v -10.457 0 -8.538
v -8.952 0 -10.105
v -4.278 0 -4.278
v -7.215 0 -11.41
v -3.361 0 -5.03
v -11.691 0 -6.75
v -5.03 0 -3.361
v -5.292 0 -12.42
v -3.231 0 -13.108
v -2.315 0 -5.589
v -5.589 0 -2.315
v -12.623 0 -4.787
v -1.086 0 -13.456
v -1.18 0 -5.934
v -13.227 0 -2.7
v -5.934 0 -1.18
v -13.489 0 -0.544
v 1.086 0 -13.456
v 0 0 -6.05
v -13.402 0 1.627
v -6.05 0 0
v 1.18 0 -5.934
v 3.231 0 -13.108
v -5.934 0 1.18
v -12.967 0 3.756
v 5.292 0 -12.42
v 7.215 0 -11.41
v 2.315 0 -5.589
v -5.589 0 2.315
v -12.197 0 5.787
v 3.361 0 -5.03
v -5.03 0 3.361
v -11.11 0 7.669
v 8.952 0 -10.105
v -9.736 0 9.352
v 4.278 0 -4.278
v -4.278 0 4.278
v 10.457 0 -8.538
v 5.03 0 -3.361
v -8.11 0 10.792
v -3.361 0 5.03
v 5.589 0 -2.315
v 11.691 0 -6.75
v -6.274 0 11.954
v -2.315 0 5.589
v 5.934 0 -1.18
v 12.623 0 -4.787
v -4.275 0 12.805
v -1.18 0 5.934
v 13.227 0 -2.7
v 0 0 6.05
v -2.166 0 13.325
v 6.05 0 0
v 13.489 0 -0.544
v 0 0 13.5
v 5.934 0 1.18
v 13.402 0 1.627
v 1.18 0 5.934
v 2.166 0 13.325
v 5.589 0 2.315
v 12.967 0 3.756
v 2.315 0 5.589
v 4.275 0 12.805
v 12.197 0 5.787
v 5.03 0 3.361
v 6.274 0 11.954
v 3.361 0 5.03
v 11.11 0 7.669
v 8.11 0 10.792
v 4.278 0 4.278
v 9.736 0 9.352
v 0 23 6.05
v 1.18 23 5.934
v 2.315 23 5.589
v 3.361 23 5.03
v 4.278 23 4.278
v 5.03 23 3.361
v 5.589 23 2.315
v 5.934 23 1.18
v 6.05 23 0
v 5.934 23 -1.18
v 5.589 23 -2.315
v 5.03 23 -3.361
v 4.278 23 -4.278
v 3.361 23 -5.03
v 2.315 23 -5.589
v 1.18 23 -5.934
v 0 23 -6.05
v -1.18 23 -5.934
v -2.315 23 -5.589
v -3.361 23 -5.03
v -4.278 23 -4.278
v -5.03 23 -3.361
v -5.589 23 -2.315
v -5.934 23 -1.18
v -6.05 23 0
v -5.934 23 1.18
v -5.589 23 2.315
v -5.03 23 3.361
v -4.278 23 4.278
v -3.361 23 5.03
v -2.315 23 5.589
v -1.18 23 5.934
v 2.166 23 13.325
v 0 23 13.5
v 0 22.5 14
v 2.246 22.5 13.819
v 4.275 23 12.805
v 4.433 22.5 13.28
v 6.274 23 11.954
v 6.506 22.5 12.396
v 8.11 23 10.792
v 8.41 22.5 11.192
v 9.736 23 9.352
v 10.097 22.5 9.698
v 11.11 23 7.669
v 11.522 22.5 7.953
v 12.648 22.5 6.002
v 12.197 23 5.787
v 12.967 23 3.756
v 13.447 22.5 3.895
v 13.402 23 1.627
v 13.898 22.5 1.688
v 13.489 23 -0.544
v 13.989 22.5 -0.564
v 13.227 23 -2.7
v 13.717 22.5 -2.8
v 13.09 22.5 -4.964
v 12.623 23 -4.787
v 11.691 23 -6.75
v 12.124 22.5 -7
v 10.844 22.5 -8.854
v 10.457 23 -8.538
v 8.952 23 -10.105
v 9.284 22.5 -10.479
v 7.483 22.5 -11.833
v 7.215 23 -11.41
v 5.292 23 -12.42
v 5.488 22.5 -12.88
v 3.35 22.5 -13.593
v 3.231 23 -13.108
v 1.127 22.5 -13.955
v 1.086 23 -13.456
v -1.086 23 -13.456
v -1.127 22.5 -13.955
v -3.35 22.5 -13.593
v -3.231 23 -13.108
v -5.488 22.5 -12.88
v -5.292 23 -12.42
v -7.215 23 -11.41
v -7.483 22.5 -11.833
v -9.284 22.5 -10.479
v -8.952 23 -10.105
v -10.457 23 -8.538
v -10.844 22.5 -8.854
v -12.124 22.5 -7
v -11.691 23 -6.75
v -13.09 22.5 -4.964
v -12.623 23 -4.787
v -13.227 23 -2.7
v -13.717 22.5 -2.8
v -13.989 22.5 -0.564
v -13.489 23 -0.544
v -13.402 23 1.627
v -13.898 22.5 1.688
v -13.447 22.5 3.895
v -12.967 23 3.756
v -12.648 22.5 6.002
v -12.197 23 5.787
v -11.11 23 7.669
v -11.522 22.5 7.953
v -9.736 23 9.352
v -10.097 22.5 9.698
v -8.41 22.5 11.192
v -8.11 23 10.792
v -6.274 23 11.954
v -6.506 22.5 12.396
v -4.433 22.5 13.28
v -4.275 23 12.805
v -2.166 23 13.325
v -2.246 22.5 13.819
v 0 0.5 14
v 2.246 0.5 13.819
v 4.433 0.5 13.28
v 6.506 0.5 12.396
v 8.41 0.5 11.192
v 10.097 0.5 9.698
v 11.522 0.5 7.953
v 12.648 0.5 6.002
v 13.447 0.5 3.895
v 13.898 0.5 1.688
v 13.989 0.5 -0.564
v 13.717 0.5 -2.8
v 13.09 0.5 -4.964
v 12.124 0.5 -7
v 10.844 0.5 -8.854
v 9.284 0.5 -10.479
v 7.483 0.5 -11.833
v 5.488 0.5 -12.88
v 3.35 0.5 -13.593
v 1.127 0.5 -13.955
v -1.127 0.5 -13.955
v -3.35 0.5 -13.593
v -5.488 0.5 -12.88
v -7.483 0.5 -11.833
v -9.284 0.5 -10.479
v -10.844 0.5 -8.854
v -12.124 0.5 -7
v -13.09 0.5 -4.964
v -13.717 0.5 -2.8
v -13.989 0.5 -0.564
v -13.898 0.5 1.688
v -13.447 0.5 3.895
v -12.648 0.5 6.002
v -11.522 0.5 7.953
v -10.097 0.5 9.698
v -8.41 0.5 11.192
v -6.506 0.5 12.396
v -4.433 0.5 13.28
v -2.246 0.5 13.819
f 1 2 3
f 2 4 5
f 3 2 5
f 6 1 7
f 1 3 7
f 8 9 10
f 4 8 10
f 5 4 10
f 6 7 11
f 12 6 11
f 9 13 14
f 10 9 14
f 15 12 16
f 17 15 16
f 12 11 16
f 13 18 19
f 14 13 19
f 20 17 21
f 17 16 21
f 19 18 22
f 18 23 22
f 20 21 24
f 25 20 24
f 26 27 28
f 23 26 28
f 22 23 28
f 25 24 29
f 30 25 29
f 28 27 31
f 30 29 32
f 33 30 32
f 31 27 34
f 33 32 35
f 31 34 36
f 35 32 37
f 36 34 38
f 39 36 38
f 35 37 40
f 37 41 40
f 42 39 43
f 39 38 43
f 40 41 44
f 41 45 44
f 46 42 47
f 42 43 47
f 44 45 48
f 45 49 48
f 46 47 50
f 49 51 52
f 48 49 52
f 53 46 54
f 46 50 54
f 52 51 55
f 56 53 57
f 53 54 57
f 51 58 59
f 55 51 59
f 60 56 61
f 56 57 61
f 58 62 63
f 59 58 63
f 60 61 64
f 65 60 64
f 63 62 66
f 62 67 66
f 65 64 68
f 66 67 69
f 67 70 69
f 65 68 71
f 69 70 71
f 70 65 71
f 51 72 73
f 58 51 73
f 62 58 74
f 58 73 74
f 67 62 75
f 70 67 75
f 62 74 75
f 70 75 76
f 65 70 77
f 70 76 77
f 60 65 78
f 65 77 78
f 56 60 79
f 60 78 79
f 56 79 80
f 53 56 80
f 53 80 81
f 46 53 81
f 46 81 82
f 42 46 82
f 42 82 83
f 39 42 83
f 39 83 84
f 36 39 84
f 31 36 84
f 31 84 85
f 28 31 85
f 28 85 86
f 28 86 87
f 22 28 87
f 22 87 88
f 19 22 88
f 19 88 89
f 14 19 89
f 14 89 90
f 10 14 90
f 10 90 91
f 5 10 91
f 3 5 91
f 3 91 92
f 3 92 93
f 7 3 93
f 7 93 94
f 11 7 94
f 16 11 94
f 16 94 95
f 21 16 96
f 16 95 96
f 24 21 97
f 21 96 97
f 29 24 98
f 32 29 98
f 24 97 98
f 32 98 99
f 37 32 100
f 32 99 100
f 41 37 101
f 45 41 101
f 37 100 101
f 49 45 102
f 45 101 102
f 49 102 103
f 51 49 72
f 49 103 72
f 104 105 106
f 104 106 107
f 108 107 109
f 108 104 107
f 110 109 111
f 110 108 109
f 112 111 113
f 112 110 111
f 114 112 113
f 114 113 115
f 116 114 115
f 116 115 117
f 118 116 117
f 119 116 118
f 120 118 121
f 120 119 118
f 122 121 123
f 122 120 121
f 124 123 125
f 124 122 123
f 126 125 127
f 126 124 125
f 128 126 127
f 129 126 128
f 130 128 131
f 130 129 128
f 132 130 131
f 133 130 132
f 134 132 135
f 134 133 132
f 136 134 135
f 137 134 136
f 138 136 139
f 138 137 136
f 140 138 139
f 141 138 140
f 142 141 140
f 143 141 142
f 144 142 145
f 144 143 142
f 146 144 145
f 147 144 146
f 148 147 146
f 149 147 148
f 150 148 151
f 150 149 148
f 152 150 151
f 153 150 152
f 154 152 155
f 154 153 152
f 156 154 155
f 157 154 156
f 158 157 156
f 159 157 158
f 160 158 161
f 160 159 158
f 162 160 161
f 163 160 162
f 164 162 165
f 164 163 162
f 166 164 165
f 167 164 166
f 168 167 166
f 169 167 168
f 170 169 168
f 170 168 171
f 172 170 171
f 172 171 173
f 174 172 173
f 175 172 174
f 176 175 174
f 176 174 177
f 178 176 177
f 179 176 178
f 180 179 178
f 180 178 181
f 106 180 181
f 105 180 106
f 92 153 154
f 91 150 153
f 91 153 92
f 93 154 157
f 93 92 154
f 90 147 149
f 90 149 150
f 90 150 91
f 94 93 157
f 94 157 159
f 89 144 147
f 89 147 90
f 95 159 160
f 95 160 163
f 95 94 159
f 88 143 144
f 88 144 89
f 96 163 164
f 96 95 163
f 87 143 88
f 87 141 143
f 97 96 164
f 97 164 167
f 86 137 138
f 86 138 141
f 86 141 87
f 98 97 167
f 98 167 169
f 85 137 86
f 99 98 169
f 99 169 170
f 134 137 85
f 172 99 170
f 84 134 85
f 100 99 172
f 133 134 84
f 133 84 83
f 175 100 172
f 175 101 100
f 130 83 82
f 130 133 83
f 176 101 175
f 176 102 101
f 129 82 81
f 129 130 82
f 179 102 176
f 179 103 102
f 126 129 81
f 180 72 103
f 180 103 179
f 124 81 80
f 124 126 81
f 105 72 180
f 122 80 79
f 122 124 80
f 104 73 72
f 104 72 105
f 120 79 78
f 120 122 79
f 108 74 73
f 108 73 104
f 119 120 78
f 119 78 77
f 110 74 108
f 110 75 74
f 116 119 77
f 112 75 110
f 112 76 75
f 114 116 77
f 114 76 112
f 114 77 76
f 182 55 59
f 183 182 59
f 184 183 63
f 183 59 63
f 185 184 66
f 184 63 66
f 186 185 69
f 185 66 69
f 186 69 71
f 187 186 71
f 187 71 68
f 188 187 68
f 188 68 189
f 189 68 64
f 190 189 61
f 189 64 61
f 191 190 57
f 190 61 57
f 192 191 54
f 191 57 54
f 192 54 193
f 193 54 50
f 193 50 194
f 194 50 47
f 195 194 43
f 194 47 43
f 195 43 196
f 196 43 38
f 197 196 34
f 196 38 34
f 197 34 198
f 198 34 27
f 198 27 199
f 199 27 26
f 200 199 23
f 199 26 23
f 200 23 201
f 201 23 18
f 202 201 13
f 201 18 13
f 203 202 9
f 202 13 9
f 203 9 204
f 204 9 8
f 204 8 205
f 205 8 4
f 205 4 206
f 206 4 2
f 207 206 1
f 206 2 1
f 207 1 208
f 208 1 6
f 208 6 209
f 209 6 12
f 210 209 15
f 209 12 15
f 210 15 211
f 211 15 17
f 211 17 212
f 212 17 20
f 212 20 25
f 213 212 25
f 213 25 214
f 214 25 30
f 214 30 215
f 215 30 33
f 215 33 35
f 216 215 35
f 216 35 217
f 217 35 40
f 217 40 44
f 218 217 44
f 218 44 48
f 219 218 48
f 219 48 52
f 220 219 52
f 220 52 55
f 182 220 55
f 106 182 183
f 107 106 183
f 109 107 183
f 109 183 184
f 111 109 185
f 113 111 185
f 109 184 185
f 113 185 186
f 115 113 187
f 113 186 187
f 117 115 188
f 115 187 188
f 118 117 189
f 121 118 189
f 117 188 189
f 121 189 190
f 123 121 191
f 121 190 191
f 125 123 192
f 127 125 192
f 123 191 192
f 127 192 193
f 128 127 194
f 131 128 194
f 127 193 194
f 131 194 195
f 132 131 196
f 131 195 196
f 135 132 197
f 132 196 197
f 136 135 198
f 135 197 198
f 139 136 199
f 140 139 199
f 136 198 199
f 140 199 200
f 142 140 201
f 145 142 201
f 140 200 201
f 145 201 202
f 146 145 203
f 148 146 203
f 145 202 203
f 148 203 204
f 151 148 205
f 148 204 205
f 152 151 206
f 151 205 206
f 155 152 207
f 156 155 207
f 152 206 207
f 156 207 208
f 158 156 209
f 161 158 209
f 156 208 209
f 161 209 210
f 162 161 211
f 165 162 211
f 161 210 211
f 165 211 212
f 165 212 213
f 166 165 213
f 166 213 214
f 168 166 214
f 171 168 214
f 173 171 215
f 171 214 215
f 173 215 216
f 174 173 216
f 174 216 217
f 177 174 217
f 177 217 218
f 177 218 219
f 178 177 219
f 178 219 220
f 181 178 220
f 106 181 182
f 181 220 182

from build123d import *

# Parameters (mm, degrees)
SKETCH2_R           = 14
BOSS_EXTRUDE1_DEPTH = 23
SKETCH3_R           = 6.05
CUT_EXTRUDE1_DEPTH  = 31.347981811
CHAMFER1_SIZE       = 0.5


with BuildPart() as part:
    # Sketch2 → Boss-Extrude1 (new body)
    with BuildSketch(Plane(origin=(0, 0, 0), x_dir=(1, 0, 0), z_dir=(0, 1, 0))):
        with Locations(Location((0, 0, 0), (0, 0, 270))):
            Circle(SKETCH2_R)
    extrude(amount=BOSS_EXTRUDE1_DEPTH)

    # Sketch3 → Cut-Extrude1 (cut, through all)
    with BuildSketch(Plane(origin=(0, 23, 0), x_dir=(1, 0, 0), z_dir=(0, 1, 0))):
        with Locations(Location((0, 0, 0), (0, 0, 270))):
            Circle(SKETCH3_R)
    extrude(amount=-CUT_EXTRUDE1_DEPTH, mode=Mode.SUBTRACT)

    # Chamfer1
    chamfer1_edges = [part.edges().sort_by_distance(p)[0] for p in [
        (0, 0, -14),
        (0, 23, -14),
    ]]
    chamfer(chamfer1_edges, length=CHAMFER1_SIZE)


solid = part.part
